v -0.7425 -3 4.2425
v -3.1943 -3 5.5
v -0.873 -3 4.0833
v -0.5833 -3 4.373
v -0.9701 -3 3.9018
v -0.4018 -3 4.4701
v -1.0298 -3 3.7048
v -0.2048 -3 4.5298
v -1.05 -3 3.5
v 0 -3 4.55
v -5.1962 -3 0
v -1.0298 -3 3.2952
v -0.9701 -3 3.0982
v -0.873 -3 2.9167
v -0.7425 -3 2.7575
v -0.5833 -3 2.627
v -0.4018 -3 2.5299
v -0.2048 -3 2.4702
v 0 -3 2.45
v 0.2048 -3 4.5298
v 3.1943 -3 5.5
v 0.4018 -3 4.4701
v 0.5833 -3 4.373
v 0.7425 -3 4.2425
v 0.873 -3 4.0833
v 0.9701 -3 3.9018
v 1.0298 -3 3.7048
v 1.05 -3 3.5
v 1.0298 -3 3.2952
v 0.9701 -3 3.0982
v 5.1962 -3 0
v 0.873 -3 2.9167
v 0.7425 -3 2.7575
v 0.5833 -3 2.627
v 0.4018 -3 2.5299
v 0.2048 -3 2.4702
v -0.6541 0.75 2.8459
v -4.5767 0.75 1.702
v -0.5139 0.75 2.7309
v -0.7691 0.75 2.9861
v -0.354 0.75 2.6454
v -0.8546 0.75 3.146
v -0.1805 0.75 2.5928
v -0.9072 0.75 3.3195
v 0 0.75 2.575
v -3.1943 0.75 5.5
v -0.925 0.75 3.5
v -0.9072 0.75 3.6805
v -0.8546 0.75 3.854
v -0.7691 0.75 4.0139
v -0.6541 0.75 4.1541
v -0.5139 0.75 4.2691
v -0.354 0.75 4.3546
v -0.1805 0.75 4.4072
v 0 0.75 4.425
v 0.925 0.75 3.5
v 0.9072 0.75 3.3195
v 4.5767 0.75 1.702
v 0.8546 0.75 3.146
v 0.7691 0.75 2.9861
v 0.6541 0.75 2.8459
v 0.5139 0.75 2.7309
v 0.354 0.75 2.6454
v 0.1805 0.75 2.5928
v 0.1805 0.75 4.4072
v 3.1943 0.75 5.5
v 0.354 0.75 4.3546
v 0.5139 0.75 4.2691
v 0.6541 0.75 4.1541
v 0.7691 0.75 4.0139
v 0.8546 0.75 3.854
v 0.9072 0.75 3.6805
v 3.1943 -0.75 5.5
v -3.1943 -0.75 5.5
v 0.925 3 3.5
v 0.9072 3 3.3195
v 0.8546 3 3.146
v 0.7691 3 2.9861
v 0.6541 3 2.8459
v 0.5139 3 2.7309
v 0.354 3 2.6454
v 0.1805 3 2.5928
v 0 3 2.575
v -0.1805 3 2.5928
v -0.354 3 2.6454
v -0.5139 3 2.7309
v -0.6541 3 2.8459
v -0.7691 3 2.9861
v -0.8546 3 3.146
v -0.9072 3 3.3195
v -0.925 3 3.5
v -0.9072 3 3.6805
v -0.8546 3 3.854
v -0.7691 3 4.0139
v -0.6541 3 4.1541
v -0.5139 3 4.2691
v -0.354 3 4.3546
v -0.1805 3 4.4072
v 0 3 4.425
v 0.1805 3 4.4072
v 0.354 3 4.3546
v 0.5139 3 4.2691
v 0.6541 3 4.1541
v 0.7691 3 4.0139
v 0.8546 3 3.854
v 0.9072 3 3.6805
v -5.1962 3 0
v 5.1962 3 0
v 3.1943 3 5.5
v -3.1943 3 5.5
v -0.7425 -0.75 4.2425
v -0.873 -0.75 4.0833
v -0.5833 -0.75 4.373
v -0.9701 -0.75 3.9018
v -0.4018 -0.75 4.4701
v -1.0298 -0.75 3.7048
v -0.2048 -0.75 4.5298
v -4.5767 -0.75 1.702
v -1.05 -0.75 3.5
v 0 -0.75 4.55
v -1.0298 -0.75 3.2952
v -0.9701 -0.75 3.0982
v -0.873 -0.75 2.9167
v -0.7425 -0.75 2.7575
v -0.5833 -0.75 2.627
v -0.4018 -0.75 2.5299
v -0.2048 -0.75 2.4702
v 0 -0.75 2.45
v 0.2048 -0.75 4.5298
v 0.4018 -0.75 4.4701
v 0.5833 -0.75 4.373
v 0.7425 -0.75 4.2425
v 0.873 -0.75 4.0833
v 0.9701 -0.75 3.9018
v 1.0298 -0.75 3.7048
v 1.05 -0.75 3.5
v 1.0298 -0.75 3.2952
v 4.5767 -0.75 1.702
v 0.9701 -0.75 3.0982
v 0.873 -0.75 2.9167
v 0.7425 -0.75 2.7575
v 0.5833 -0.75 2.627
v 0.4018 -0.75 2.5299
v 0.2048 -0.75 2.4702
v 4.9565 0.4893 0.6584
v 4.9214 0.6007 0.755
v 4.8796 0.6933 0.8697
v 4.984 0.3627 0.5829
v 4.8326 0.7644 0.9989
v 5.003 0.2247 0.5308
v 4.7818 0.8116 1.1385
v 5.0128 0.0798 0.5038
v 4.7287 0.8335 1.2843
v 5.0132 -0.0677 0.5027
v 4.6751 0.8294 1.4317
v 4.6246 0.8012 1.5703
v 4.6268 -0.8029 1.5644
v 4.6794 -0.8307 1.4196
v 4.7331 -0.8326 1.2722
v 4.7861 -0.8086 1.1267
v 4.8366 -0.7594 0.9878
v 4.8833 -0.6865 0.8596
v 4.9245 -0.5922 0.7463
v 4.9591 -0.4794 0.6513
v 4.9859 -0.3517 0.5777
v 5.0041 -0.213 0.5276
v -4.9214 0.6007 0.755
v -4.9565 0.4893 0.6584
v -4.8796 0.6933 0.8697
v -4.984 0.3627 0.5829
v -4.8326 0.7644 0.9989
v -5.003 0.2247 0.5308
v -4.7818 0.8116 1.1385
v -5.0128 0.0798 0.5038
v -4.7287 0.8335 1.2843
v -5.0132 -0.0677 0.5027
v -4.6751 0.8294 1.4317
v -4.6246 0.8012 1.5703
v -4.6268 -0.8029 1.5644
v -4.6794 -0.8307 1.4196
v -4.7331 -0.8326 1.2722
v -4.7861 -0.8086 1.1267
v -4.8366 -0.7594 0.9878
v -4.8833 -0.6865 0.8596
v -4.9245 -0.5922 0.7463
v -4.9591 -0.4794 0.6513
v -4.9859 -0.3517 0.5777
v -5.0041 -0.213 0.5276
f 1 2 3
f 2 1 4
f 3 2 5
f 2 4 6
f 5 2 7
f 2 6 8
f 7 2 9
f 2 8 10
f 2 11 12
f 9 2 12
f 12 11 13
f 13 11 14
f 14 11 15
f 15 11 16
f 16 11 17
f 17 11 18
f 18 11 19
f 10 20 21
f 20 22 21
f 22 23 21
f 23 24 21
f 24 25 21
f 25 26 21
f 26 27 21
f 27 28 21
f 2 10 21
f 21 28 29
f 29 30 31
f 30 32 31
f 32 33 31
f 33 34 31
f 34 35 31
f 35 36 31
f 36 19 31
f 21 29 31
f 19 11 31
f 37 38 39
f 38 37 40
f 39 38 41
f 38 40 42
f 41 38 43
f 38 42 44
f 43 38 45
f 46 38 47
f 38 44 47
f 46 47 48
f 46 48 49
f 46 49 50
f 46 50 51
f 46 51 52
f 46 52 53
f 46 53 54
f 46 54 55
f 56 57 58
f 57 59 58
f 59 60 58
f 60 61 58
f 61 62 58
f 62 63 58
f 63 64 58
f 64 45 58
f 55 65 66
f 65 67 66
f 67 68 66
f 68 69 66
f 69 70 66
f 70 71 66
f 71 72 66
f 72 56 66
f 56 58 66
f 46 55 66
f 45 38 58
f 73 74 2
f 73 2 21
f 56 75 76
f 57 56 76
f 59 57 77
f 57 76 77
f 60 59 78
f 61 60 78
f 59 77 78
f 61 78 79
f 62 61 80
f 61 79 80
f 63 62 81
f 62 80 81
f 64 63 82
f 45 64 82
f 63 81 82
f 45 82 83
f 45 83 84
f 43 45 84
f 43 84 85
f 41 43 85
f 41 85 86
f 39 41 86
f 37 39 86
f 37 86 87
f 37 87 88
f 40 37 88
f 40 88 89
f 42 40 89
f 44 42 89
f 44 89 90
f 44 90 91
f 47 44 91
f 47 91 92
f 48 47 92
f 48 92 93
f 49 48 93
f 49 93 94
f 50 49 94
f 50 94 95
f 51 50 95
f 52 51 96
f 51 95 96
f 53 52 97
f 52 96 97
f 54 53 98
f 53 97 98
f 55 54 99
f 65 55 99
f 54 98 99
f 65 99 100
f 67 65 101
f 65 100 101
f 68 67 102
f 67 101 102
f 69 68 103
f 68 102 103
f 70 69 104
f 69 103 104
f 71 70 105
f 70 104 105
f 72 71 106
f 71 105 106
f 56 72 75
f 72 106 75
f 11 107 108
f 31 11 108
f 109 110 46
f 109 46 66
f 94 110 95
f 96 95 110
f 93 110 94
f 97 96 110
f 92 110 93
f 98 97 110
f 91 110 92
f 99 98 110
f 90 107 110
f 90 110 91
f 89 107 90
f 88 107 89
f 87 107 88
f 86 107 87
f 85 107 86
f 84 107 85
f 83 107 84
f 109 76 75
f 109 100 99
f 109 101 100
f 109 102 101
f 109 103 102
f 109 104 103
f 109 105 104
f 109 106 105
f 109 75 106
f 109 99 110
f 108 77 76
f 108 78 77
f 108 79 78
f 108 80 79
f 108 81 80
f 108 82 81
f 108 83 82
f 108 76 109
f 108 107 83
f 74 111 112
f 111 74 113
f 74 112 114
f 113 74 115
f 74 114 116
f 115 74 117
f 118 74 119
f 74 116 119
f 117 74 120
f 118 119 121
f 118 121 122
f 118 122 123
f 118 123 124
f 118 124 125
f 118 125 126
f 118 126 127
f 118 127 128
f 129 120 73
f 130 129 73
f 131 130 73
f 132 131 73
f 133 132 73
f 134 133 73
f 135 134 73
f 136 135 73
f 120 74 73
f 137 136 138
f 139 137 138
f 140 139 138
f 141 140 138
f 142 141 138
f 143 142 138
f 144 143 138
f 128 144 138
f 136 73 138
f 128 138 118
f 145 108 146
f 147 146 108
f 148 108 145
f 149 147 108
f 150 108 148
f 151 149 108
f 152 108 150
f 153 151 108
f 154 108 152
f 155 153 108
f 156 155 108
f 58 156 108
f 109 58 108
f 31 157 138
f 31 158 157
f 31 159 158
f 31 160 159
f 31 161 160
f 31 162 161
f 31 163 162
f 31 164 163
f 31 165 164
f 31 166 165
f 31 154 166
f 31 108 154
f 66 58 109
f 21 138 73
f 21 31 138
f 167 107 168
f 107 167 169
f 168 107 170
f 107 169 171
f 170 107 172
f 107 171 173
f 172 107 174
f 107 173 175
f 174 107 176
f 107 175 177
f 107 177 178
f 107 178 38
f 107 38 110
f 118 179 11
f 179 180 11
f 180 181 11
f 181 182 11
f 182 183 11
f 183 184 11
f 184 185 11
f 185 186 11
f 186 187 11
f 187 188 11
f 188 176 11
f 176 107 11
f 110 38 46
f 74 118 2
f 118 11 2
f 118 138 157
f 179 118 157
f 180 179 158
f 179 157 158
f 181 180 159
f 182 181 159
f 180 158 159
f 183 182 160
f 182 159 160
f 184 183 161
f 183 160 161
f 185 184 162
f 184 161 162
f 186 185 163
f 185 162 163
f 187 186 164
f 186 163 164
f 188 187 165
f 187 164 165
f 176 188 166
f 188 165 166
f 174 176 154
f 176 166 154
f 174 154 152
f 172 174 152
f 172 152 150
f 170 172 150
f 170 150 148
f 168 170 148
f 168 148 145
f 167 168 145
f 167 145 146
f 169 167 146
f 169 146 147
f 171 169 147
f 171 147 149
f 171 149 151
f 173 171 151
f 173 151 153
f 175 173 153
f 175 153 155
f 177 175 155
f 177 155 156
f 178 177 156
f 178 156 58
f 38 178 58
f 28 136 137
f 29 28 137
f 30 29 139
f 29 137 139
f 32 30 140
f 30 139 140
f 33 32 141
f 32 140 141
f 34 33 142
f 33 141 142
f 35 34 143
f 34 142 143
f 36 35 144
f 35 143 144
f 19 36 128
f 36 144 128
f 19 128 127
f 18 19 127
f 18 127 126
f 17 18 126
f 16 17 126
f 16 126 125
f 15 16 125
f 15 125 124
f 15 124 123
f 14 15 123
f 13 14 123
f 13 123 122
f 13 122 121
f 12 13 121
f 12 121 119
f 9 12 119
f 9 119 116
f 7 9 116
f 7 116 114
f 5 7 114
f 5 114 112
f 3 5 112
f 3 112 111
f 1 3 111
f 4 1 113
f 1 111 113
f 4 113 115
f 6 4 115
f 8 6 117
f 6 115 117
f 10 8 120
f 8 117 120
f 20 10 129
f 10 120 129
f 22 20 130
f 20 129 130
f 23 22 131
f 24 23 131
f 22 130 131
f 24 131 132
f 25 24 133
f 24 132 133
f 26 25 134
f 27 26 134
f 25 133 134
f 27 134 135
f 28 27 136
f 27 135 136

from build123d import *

# Parameters (mm, degrees)
SKETCH8_W           = 10.392304846
SKETCH8_H           = 6
BOSS_EXTRUDE3_DEPTH = 5.5
CUT_EXTRUDE5_DEPTH  = 11.392304845
CUT_EXTRUDE7_REACH  = 8
SKETCH11_R          = 0.925
CUT_EXTRUDE8_REACH  = 4.25
SKETCH12_R          = 1.05
CUT_EXTRUDE6_DEPTH  = 7


with BuildPart() as part:
    # Sketch8 → Boss-Extrude3 (new body)
    with BuildSketch(Plane.XY):
        Rectangle(SKETCH8_W, SKETCH8_H)
    extrude(amount=BOSS_EXTRUDE3_DEPTH)

    # Sketch9 → Cut-Extrude5 (cut, through all)
    with BuildSketch(Plane(origin=(5.196152423, 0, 0), x_dir=(0, 0, -1), z_dir=(1, 0, 0))):
        with BuildLine():
            Line((-1.702049043, 0.75), (-5.5, 0.75))
            Line((-5.5, 0.75), (-5.5, -0.75))
            Line((-5.5, -0.75), (-1.702049043, -0.75))
            ThreePointArc((-1.702049043, -0.75), (-0.5, 0), (-1.702049043, 0.75))
        make_face()
    extrude(amount=-CUT_EXTRUDE5_DEPTH, mode=Mode.SUBTRACT)

    # Sketch11 → Cut-Extrude7 (cut, up to next)
    with BuildSketch(Plane(origin=(0, 3, 0), x_dir=(1, 0, 0), z_dir=(0, 1, 0)), mode=Mode.PRIVATE) as cut_extrude7_sk1:
        with Locations((0, -3.5)):
            Circle(SKETCH11_R)
    cut_extrude7_tool1 = extrude(cut_extrude7_sk1.sketch, amount=-CUT_EXTRUDE7_REACH, mode=Mode.PRIVATE) & part.part
    add(cut_extrude7_tool1.solids().sort_by_distance((0, 3, 3.5))[0], mode=Mode.SUBTRACT)

    # Sketch12 → Cut-Extrude8 (cut, up to next)
    with BuildSketch(Plane(origin=(0, -0.75, 0), x_dir=(1, 0, 0), z_dir=(0, 1, 0)), mode=Mode.PRIVATE) as cut_extrude8_sk1:
        with Locations((0, -3.5)):
            Circle(SKETCH12_R)
    cut_extrude8_tool1 = extrude(cut_extrude8_sk1.sketch, amount=-CUT_EXTRUDE8_REACH, mode=Mode.PRIVATE) & part.part
    add(cut_extrude8_tool1.solids().sort_by_distance((0, -0.75, 3.5))[0], mode=Mode.SUBTRACT)

    # Sketch10 → Cut-Extrude6 (cut, through all)
    with BuildSketch(Plane.XZ.offset(3)):
        Polygon((5.196152423, 0), (3.194316134, 5.5), (5.196152423, 5.5), align=None)
        Polygon((-5.196152423, 5.5), (-5.196152423, 0), (-3.194316134, 5.5), align=None)
    extrude(amount=-CUT_EXTRUDE6_DEPTH, mode=Mode.SUBTRACT)


solid = part.part
